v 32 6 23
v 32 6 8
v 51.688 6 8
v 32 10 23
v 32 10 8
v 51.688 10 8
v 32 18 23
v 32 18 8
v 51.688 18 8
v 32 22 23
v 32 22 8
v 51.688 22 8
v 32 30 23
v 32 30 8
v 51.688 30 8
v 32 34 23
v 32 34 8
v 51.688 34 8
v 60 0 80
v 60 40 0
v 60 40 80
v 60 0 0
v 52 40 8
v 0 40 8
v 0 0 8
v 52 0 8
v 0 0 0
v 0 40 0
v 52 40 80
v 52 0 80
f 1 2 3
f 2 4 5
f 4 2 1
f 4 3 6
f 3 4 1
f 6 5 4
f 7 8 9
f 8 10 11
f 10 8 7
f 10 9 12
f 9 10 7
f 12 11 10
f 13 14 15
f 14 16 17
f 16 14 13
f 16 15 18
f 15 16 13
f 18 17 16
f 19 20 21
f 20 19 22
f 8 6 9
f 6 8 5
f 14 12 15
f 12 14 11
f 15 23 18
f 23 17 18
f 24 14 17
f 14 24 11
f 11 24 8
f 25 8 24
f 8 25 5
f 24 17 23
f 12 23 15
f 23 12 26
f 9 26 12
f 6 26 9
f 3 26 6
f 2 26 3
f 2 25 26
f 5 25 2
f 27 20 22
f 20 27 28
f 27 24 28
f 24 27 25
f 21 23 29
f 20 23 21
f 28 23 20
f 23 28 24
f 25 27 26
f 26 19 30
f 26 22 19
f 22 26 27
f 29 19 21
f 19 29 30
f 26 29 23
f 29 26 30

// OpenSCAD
$fn = 32;

// ----------------------------------------------------------------------
// Rib bracket: 3-gusset L bracket
// ----------------------------------------------------------------------

// --- parameters (mm) ---
base_l = 60;              // foot length, X
base_w = 40;              // foot width, Y
base_t = 8;               // foot thickness
plate_t = 8;              // upright plate thickness
plate_h = 80;             // overall height
gus_l = 20;               // gusset leg along the foot
gus_h = 16;               // gusset height
gus_t = 4;                // gusset thickness
gus_edge = 6;             // gusset margin from the foot edge
n_gus = 3;                // gusset count
fit_tol = 0.02;           // tolerance for press fits, mm
free_tol = 0.2;           // tolerance for clearance fits, mm

gus_pitch = (base_w - 2 * gus_edge - gus_t) / (n_gus - 1);  // gusset pitch

union() {
  cube([base_l, base_w, base_t]);
  translate([base_l - plate_t, 0, base_t - 1])
    cube([plate_t, base_w, plate_h - base_t + 1]);
  for (i = [0 : n_gus - 1])
    translate([base_l - plate_t - gus_l, gus_edge + i * gus_pitch, base_t - 1])
      rotate([-90, 0, 0])
        linear_extrude(height = gus_t)
          polygon(points = [[0, 0], [gus_l + 1, 0], [0, -gus_h]]);
}
